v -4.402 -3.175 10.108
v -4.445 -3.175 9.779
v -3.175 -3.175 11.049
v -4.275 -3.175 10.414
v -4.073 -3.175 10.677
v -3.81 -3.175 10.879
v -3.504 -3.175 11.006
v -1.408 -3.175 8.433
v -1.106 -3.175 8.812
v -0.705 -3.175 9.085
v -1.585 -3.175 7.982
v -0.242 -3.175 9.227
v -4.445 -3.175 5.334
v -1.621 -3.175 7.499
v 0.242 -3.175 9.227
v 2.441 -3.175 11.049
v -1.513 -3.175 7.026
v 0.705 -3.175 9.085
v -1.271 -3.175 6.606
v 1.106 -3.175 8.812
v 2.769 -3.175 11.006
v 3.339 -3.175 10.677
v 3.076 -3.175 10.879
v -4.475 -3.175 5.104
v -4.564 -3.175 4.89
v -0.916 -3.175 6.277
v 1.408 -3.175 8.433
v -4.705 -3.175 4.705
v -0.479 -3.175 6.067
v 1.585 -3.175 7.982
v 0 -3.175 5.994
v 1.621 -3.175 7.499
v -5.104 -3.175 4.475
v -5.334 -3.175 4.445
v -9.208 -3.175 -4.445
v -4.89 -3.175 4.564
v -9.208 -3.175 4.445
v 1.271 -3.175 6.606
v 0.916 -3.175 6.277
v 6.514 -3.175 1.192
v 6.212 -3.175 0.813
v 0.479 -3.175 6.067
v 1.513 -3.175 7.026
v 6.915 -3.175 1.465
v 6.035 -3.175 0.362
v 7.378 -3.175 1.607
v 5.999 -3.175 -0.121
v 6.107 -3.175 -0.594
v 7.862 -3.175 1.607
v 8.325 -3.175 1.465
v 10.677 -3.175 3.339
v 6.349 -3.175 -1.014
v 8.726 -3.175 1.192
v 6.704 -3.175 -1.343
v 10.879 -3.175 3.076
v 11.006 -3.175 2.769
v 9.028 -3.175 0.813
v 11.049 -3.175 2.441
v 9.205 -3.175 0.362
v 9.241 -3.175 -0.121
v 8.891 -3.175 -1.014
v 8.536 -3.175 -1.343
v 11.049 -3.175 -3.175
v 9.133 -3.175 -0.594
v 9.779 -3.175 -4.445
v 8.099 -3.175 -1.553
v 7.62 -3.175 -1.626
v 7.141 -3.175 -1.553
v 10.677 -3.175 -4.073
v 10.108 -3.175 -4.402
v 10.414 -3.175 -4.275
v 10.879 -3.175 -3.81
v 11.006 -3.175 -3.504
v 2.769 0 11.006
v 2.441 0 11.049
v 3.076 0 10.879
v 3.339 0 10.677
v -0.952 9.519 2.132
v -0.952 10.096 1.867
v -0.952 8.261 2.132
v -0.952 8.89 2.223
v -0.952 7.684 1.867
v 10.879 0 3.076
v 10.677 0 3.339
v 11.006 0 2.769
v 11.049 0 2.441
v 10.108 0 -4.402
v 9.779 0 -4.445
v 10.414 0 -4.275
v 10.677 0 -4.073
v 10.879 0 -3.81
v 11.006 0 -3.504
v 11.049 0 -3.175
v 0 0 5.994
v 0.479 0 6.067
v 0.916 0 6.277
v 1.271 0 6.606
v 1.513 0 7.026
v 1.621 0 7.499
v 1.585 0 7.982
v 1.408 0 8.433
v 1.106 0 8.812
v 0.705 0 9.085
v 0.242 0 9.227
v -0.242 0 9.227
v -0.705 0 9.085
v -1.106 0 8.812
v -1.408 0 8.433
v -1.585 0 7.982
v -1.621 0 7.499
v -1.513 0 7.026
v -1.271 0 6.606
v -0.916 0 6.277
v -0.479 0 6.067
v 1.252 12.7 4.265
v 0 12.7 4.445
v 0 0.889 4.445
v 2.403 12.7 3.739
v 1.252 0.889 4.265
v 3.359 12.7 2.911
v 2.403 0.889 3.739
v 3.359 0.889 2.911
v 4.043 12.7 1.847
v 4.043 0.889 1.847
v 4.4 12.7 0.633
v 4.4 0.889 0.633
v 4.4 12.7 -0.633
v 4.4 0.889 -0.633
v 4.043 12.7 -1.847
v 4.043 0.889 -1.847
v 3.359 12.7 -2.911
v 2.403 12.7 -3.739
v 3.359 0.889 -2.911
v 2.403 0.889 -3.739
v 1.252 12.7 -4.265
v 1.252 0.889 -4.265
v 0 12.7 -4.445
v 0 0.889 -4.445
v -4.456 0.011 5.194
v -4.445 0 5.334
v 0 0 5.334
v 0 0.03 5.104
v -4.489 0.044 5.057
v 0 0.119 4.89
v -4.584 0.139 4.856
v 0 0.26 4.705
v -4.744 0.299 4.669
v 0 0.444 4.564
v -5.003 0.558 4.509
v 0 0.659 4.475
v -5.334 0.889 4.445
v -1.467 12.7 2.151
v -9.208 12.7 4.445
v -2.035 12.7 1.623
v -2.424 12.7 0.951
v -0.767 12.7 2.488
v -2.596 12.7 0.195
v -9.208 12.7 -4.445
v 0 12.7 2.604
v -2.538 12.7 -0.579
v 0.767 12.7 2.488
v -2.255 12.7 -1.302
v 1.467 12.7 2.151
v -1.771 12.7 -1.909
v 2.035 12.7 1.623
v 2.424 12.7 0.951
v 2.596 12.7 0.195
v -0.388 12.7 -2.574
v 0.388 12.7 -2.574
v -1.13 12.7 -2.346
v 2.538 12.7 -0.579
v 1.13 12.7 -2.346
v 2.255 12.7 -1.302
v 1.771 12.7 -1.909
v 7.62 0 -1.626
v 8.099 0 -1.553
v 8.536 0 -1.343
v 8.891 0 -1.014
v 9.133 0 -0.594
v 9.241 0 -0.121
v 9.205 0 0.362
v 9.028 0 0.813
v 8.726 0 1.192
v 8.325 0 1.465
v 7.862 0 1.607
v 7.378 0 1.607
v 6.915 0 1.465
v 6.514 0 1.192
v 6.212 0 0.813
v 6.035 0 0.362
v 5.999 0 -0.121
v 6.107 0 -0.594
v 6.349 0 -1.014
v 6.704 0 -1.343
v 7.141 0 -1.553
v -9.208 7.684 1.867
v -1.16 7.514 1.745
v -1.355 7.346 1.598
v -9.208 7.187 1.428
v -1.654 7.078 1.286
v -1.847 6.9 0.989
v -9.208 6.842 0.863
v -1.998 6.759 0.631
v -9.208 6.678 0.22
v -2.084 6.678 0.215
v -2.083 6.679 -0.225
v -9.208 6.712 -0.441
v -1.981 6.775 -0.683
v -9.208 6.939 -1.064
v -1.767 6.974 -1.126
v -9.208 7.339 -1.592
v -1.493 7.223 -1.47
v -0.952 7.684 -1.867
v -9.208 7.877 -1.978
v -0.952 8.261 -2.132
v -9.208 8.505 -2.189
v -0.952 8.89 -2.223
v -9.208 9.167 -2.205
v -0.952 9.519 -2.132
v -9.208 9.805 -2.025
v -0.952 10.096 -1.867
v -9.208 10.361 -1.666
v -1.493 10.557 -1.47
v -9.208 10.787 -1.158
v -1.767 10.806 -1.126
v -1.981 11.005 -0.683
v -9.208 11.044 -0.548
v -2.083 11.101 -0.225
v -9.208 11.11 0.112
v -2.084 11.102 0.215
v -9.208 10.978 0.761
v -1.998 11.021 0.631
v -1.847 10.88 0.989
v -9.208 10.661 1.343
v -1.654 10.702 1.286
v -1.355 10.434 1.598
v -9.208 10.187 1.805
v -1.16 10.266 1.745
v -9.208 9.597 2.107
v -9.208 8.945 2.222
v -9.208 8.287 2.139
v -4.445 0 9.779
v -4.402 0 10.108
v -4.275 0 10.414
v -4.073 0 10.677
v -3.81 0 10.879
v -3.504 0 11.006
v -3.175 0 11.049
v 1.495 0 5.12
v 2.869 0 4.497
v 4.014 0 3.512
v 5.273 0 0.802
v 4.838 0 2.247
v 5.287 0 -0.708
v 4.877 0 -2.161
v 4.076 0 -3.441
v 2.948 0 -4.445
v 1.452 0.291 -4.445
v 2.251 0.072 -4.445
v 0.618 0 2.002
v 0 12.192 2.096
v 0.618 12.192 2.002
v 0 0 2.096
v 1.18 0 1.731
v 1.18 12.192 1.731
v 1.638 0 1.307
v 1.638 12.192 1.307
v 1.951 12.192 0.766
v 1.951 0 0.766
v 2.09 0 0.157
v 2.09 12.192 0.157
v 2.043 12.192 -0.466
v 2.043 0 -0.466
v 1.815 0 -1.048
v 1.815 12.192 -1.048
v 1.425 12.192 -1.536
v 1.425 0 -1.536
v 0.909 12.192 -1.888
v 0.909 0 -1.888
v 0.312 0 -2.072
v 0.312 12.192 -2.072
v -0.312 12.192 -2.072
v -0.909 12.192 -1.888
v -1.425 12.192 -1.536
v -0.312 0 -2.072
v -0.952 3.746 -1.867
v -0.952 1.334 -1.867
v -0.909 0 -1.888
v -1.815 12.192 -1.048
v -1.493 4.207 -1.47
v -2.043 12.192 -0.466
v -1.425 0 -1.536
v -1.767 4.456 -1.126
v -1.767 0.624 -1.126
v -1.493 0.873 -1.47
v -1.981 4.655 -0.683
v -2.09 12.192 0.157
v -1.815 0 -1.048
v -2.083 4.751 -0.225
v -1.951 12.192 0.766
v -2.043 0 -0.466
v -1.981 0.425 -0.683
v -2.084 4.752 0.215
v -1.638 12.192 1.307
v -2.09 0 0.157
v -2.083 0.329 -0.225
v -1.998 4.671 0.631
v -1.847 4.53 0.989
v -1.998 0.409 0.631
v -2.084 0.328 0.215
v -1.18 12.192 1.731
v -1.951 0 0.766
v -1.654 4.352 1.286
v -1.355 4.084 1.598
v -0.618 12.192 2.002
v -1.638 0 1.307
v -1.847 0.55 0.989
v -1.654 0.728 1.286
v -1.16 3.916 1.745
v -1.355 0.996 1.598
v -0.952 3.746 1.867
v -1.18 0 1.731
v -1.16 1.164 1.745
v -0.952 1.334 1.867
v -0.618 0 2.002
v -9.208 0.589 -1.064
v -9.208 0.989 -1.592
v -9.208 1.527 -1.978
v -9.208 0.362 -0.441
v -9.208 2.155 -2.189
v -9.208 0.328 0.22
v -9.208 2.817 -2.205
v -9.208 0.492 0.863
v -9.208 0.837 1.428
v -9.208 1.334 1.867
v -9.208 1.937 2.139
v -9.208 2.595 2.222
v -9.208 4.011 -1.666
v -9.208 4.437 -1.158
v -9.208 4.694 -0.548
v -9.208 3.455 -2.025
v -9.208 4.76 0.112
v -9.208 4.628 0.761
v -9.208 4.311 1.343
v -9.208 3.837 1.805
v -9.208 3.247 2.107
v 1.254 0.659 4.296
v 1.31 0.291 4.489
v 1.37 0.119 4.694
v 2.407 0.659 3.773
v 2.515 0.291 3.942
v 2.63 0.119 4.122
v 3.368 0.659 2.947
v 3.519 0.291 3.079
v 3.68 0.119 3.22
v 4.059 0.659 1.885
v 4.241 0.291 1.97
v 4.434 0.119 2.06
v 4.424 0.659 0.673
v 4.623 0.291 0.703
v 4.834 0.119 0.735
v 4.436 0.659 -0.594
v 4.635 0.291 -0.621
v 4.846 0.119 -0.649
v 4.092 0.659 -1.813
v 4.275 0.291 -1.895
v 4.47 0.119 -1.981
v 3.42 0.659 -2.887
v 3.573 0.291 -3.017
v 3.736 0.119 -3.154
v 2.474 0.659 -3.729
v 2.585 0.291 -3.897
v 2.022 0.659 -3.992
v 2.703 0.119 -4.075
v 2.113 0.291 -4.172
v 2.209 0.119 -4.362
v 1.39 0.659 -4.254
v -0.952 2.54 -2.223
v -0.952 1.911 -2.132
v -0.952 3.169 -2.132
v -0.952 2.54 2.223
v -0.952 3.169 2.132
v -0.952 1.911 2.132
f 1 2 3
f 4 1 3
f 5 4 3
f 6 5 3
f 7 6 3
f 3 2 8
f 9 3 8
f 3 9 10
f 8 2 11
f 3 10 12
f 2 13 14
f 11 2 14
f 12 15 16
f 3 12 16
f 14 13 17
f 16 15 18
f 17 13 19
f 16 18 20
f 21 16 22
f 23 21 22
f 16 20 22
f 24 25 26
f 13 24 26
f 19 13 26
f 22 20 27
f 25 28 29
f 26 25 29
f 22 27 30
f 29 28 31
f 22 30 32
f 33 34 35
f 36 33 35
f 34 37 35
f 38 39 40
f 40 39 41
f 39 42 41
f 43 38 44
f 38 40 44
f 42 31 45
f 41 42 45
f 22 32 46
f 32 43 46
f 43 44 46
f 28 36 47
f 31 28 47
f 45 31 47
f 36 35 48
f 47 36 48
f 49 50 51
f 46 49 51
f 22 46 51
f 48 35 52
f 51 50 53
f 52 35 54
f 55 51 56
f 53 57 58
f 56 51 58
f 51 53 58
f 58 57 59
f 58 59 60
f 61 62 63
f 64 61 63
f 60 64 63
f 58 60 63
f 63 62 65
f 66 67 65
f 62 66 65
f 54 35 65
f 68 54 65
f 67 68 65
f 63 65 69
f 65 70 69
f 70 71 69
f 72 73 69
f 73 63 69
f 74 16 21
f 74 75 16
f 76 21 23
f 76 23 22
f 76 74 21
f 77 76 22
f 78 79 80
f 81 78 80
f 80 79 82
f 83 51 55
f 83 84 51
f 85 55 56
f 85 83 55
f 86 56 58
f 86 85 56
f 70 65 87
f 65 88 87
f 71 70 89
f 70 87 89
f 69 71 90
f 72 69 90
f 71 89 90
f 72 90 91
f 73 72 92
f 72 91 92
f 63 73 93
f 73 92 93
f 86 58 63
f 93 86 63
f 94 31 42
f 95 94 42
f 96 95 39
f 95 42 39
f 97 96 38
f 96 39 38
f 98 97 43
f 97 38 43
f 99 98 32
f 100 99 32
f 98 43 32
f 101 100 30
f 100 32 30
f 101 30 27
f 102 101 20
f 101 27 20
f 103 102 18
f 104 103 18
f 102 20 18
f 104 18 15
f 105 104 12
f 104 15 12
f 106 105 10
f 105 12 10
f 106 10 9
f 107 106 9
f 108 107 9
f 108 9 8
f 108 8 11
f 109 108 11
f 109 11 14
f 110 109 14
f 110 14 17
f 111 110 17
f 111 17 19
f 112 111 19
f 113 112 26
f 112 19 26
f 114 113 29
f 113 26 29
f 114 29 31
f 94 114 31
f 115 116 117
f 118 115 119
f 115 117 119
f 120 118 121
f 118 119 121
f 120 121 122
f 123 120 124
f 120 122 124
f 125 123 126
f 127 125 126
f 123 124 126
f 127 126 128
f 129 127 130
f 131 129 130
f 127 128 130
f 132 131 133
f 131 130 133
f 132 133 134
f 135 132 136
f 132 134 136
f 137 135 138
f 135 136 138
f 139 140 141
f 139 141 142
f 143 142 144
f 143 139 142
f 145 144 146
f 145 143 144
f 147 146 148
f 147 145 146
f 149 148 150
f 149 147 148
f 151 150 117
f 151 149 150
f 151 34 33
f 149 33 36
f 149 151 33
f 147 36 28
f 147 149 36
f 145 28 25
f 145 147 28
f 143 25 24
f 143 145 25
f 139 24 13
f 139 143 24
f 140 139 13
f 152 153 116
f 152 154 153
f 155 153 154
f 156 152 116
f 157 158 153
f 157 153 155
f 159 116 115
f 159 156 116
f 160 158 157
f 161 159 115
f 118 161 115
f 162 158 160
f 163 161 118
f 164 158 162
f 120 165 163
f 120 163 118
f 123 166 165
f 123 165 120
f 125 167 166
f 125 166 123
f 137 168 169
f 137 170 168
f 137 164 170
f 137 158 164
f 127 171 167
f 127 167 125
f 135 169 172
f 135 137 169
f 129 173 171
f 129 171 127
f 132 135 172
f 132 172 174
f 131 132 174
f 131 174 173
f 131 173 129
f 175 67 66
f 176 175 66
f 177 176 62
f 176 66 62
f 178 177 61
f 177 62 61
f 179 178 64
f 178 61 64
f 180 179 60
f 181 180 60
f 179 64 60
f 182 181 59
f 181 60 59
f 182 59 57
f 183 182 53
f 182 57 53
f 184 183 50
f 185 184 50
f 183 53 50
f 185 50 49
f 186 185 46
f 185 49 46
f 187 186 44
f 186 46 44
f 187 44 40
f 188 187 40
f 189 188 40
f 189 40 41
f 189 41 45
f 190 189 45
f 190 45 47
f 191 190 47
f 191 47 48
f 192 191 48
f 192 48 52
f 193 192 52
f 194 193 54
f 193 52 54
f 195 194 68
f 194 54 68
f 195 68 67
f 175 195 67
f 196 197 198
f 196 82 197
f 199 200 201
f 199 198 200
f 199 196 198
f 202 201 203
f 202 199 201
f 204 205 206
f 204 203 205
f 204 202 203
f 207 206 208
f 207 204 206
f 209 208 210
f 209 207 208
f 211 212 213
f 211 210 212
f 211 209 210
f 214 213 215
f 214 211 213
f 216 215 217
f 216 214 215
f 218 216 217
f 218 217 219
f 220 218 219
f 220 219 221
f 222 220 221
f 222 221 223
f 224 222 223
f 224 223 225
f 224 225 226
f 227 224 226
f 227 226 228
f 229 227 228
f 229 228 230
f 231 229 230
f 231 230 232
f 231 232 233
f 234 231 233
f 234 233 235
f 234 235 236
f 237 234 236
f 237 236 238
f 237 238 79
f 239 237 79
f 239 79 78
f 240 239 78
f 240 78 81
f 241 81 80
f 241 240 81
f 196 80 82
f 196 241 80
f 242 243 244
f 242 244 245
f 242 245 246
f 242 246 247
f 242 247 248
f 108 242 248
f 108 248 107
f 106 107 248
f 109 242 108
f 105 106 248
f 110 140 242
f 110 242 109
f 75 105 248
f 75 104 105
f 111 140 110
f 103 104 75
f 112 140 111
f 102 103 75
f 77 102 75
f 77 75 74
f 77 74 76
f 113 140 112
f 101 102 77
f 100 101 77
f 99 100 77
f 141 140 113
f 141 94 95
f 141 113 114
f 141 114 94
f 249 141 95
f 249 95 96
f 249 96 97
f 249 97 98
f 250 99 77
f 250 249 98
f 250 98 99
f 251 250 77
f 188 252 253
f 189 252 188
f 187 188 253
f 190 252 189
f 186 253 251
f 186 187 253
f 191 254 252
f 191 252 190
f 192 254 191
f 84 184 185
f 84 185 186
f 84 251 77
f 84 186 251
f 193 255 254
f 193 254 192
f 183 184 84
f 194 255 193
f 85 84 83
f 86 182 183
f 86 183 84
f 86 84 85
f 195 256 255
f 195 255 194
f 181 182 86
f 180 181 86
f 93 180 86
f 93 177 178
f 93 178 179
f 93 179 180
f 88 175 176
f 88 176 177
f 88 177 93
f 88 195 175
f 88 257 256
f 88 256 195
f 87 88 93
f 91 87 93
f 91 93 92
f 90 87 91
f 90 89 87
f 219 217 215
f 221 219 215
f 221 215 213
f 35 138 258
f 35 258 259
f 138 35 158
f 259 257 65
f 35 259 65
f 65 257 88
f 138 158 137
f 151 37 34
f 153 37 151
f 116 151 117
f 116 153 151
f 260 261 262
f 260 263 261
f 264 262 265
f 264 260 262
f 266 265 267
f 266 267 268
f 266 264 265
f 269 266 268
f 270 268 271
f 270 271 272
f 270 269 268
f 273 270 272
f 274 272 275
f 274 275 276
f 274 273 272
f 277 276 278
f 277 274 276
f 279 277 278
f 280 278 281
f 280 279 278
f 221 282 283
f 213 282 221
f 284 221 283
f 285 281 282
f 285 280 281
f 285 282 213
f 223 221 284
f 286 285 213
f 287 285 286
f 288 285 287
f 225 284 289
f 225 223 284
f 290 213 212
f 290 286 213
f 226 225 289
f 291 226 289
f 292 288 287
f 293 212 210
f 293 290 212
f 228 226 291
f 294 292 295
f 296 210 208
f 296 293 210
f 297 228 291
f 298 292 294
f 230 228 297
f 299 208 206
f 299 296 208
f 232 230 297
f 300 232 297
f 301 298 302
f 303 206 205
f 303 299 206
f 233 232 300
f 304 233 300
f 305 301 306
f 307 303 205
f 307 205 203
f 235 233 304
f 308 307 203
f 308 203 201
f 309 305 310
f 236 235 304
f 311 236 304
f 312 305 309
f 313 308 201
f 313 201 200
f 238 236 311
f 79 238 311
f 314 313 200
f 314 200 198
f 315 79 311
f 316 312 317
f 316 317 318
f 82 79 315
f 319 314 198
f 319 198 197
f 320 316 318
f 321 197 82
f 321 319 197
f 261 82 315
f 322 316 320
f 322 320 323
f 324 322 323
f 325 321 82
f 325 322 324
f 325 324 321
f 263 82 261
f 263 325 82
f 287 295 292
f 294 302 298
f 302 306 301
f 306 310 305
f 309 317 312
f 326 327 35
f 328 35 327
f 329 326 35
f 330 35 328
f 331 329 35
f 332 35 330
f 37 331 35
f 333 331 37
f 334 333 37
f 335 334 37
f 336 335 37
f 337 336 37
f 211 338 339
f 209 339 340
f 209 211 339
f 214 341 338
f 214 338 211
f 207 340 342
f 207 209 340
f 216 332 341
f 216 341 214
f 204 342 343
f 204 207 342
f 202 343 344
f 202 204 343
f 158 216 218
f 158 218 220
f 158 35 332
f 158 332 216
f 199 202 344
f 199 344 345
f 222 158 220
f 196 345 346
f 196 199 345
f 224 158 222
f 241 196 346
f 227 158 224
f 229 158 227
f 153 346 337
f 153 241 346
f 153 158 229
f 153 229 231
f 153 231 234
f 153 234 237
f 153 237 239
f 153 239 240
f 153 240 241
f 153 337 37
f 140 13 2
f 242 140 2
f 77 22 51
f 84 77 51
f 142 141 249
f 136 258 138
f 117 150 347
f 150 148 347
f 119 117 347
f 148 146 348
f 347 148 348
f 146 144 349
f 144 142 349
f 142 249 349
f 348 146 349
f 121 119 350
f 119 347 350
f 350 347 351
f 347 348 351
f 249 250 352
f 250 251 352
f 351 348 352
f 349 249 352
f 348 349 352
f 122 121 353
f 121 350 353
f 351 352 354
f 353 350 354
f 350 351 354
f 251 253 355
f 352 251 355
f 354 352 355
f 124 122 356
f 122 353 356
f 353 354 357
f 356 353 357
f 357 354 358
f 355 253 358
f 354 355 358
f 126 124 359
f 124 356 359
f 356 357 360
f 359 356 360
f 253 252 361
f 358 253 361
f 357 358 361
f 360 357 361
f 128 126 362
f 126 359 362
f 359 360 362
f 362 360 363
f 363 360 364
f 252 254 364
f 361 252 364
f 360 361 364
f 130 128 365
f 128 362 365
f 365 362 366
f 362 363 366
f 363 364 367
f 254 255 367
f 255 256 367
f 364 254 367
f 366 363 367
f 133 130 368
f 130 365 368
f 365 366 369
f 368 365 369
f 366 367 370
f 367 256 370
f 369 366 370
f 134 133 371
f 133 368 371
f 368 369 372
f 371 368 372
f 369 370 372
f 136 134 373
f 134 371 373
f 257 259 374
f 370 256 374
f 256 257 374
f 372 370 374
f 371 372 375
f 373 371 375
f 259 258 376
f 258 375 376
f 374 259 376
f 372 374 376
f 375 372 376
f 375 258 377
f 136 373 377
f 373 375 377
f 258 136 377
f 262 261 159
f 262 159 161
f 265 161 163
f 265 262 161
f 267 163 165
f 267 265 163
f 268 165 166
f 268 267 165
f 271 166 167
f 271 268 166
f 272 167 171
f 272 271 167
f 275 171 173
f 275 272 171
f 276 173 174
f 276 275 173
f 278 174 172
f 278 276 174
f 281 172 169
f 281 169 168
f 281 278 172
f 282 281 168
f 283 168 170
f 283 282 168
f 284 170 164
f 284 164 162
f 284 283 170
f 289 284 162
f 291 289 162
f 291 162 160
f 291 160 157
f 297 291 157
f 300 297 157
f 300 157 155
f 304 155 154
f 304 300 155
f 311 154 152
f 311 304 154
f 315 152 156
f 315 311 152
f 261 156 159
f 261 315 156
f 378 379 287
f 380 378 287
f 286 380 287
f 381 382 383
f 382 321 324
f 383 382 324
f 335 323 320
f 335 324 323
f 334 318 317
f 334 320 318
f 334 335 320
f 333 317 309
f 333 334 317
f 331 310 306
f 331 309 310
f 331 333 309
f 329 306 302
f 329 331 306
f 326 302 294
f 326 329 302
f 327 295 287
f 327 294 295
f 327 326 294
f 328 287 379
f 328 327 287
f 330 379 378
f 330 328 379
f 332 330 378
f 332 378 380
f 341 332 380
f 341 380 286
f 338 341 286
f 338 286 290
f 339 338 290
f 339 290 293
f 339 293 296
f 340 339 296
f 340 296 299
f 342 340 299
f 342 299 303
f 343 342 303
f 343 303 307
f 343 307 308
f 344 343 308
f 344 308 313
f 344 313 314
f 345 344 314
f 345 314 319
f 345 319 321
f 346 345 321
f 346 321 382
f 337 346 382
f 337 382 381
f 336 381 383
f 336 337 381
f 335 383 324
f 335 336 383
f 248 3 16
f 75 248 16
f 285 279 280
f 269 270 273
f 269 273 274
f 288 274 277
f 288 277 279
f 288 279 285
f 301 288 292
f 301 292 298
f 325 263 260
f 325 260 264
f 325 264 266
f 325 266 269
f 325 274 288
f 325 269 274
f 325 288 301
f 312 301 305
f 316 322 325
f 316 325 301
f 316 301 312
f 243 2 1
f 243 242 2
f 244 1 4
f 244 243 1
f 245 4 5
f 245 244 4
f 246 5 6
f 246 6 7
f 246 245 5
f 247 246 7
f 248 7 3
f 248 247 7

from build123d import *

# Parameters (mm, degrees)
SKETCH1_R           = 4.445
SKETCH1_R_2         = 2.0955
BOSS_EXTRUDE1_DEPTH = 12.7
BOSS_EXTRUDE2_START = 3.175
SKETCH2_R           = 1.6256
BOSS_EXTRUDE2_DEPTH = 3.175
FILLET5_R           = 1.27
BOSS_EXTRUDE3_REACH = 24.275
CHAMFER1_SIZE       = 0.508
SKETCH3_R           = 2.2225
CUT_EXTRUDE1_DEPTH  = 8.255
FILLET6_R           = 0.889


with BuildPart() as part:
    # Sketch1 → Boss-Extrude1 (new body)
    with BuildSketch(Plane(origin=(0, 0, 0), x_dir=(1, 0, 0), z_dir=(0, 1, 0))):
        with Locations(Location((0, 0, 0), (0, 0, 270))):
            Circle(SKETCH1_R)
        with Locations(Location((0, 0, 0), (0, 0, 270))):
            Circle(SKETCH1_R_2, mode=Mode.SUBTRACT)
    extrude(amount=BOSS_EXTRUDE1_DEPTH)

    # Sketch2 → Boss-Extrude2 (add)
    with BuildSketch(Plane.XZ.offset(BOSS_EXTRUDE2_START)):
        with BuildLine():
            Line((-4.445, 0), (-4.445, 11.049))
            Line((-4.445, 11.049), (2.966769491, 11.049))
            Line((2.966769491, 11.049), (11.049, 2.966769491))
            Line((11.049, 2.966769491), (11.049, -4.445))
            Line((11.049, -4.445), (0, -4.445))
            ThreePointArc((0, -4.445), (-3.143089642, -3.143089642), (-4.445, 0))
        make_face()
        with Locations(Location((0, 7.62, 0), (0, 0, 270))):
            Circle(SKETCH2_R, mode=Mode.SUBTRACT)
        with Locations(Location((7.62, 0, 0), (0, 0, 270))):
            Circle(SKETCH2_R, mode=Mode.SUBTRACT)
    extrude(amount=-BOSS_EXTRUDE2_DEPTH)

    # Fillet5
    fillet5_edges = [part.edges().sort_by_distance(p)[0] for p in [
        (11.049, -1.5875, -4.445),
        (11.049, -1.5875, 2.966769491),
        (2.966769491, -1.5875, 11.049),
        (-4.445, -1.5875, 11.049),
    ]]
    fillet(fillet5_edges, radius=FILLET5_R)

    # Boss-Extrude3: up to this face of the body (flat: up to its plane)
    boss_extrude3_end = Plane(part.part.faces().sort_by_distance((2.521124126, -3.175, 2.521124126))[0])
    # Sketch4 → Boss-Extrude3 (add, up to the picked face)
    with BuildSketch(Plane(origin=(0, 12.7, 0), x_dir=(1, 0, 0), z_dir=(0, 1, 0)), mode=Mode.PRIVATE) as boss_extrude3_sk1:
        with BuildLine():
            Line((0, 4.445), (-9.2075, 4.445))
            Line((-9.2075, 4.445), (-9.2075, -4.445))
            Line((-9.2075, -4.445), (0, -4.445))
            ThreePointArc((0, -4.445), (-4.445, 0), (0, 4.445))
        make_face()
    boss_extrude3_tool1 = split(extrude(boss_extrude3_sk1.sketch, amount=-BOSS_EXTRUDE3_REACH, mode=Mode.PRIVATE), bisect_by=boss_extrude3_end, keep=Keep.BOTH, mode=Mode.PRIVATE)
    add(boss_extrude3_tool1.solids().sort_by(Axis((-6.263205, 12.7, 0), (0, -1, 0)))[0])

    # Chamfer1
    chamfer1_edges = [part.edges().sort_by_distance(p)[0] for p in [
        (0, 12.7, -2.0955),
    ]]
    chamfer(chamfer1_edges, length=CHAMFER1_SIZE)

    # Sketch3 → Cut-Extrude1 (cut)
    with BuildSketch(Plane(origin=(-9.2075, 0, 0), x_dir=(0, 0, -1), z_dir=(1, 0, 0))):
        with Locations(Location((0, 8.89, 0), (0, 0, 212.878349564))):
            Circle(SKETCH3_R)
        with Locations(Location((0, 2.54, 0), (0, 0, 212.878349564))):
            Circle(SKETCH3_R)
    extrude(amount=CUT_EXTRUDE1_DEPTH, mode=Mode.SUBTRACT)

    # Fillet6
    # the kernel refuses this fillet: 0.889 mm, written as the material it adds along each edge
    with BuildSketch(Plane(origin=(-4.445, 0, 4.445), x_dir=(-1, 0, 0), z_dir=(0, -1, 0))) as fillet6_piece_1:
        with BuildLine():
            CenterArc((FILLET6_R, -FILLET6_R), FILLET6_R, 90, 90)
            Line((0, -FILLET6_R), (0, 0))
            Line((0, 0), (FILLET6_R, 0))
        make_face()
    extrude(amount=3.175)
    with BuildSketch(Plane(origin=(0, 0, 0), x_dir=(0, 0, 1), z_dir=(-1, 0, 0))) as fillet6_piece_2_section:
        with BuildLine():
            CenterArc((4.445 + FILLET6_R, FILLET6_R), FILLET6_R, 180, 90)
            Line((4.445 + FILLET6_R, 0), (4.445, 0))
            Line((4.445, 0), (4.445, FILLET6_R))
        make_face()
    fillet6_piece_2 = revolve(axis=Axis((0, 0, 0), (0, 1, 0)), revolution_arc=228.779733666, mode=Mode.PRIVATE)
    fillet6_piece_2 = split(fillet6_piece_2, bisect_by=Plane(origin=(0, 0, -4.445), z_dir=(0, 0, 1)), keep=Keep.TOP, mode=Mode.PRIVATE)
    add(fillet6_piece_2)
    with BuildSketch(Plane(origin=(-4.445, 0, 4.445), x_dir=(0, 1, 0), z_dir=(1, 0, 0))) as fillet6_piece_3:
        with BuildLine():
            CenterArc((FILLET6_R, FILLET6_R), FILLET6_R, 180, 90)
            Line((0, FILLET6_R), (0, 0))
            Line((0, 0), (FILLET6_R, 0))
        make_face()
    extrude(amount=4.445)
    with BuildSketch(Plane(origin=(-6.6675, 0, 4.445), x_dir=(0, 1, 0), z_dir=(1, 0, 0))) as fillet6_piece_4a_section:
        with BuildLine():
            CenterArc((FILLET6_R, FILLET6_R), FILLET6_R, 180, 90)
            Line((0, FILLET6_R), (0, 0))
            Line((0, 0), (FILLET6_R, 0))
        make_face()
    fillet6_piece_4a = extrude(amount=6.6675, mode=Mode.PRIVATE)
    fillet6_piece_4a = split(fillet6_piece_4a, bisect_by=Plane(origin=(-4.445, 0, 4.445), z_dir=(-1, 0, 0)), keep=Keep.TOP, mode=Mode.PRIVATE)
    with BuildSketch(Plane(origin=(-4.445, 2.2225, 4.445), x_dir=(-1, 0, 0), z_dir=(0, -1, 0))) as fillet6_piece_4b_section:
        with BuildLine():
            CenterArc((FILLET6_R, -FILLET6_R), FILLET6_R, 90, 90)
            Line((0, -FILLET6_R), (0, 0))
            Line((0, 0), (FILLET6_R, 0))
        make_face()
    fillet6_piece_4b = extrude(amount=5.3975, mode=Mode.PRIVATE)
    fillet6_piece_4b = split(fillet6_piece_4b, bisect_by=Plane(origin=(-4.445, 0, 4.445), z_dir=(0, 1, 0)), keep=Keep.TOP, mode=Mode.PRIVATE)
    fillet6_piece_4 = fillet6_piece_4a & fillet6_piece_4b
    add(fillet6_piece_4)


solid = part.part
